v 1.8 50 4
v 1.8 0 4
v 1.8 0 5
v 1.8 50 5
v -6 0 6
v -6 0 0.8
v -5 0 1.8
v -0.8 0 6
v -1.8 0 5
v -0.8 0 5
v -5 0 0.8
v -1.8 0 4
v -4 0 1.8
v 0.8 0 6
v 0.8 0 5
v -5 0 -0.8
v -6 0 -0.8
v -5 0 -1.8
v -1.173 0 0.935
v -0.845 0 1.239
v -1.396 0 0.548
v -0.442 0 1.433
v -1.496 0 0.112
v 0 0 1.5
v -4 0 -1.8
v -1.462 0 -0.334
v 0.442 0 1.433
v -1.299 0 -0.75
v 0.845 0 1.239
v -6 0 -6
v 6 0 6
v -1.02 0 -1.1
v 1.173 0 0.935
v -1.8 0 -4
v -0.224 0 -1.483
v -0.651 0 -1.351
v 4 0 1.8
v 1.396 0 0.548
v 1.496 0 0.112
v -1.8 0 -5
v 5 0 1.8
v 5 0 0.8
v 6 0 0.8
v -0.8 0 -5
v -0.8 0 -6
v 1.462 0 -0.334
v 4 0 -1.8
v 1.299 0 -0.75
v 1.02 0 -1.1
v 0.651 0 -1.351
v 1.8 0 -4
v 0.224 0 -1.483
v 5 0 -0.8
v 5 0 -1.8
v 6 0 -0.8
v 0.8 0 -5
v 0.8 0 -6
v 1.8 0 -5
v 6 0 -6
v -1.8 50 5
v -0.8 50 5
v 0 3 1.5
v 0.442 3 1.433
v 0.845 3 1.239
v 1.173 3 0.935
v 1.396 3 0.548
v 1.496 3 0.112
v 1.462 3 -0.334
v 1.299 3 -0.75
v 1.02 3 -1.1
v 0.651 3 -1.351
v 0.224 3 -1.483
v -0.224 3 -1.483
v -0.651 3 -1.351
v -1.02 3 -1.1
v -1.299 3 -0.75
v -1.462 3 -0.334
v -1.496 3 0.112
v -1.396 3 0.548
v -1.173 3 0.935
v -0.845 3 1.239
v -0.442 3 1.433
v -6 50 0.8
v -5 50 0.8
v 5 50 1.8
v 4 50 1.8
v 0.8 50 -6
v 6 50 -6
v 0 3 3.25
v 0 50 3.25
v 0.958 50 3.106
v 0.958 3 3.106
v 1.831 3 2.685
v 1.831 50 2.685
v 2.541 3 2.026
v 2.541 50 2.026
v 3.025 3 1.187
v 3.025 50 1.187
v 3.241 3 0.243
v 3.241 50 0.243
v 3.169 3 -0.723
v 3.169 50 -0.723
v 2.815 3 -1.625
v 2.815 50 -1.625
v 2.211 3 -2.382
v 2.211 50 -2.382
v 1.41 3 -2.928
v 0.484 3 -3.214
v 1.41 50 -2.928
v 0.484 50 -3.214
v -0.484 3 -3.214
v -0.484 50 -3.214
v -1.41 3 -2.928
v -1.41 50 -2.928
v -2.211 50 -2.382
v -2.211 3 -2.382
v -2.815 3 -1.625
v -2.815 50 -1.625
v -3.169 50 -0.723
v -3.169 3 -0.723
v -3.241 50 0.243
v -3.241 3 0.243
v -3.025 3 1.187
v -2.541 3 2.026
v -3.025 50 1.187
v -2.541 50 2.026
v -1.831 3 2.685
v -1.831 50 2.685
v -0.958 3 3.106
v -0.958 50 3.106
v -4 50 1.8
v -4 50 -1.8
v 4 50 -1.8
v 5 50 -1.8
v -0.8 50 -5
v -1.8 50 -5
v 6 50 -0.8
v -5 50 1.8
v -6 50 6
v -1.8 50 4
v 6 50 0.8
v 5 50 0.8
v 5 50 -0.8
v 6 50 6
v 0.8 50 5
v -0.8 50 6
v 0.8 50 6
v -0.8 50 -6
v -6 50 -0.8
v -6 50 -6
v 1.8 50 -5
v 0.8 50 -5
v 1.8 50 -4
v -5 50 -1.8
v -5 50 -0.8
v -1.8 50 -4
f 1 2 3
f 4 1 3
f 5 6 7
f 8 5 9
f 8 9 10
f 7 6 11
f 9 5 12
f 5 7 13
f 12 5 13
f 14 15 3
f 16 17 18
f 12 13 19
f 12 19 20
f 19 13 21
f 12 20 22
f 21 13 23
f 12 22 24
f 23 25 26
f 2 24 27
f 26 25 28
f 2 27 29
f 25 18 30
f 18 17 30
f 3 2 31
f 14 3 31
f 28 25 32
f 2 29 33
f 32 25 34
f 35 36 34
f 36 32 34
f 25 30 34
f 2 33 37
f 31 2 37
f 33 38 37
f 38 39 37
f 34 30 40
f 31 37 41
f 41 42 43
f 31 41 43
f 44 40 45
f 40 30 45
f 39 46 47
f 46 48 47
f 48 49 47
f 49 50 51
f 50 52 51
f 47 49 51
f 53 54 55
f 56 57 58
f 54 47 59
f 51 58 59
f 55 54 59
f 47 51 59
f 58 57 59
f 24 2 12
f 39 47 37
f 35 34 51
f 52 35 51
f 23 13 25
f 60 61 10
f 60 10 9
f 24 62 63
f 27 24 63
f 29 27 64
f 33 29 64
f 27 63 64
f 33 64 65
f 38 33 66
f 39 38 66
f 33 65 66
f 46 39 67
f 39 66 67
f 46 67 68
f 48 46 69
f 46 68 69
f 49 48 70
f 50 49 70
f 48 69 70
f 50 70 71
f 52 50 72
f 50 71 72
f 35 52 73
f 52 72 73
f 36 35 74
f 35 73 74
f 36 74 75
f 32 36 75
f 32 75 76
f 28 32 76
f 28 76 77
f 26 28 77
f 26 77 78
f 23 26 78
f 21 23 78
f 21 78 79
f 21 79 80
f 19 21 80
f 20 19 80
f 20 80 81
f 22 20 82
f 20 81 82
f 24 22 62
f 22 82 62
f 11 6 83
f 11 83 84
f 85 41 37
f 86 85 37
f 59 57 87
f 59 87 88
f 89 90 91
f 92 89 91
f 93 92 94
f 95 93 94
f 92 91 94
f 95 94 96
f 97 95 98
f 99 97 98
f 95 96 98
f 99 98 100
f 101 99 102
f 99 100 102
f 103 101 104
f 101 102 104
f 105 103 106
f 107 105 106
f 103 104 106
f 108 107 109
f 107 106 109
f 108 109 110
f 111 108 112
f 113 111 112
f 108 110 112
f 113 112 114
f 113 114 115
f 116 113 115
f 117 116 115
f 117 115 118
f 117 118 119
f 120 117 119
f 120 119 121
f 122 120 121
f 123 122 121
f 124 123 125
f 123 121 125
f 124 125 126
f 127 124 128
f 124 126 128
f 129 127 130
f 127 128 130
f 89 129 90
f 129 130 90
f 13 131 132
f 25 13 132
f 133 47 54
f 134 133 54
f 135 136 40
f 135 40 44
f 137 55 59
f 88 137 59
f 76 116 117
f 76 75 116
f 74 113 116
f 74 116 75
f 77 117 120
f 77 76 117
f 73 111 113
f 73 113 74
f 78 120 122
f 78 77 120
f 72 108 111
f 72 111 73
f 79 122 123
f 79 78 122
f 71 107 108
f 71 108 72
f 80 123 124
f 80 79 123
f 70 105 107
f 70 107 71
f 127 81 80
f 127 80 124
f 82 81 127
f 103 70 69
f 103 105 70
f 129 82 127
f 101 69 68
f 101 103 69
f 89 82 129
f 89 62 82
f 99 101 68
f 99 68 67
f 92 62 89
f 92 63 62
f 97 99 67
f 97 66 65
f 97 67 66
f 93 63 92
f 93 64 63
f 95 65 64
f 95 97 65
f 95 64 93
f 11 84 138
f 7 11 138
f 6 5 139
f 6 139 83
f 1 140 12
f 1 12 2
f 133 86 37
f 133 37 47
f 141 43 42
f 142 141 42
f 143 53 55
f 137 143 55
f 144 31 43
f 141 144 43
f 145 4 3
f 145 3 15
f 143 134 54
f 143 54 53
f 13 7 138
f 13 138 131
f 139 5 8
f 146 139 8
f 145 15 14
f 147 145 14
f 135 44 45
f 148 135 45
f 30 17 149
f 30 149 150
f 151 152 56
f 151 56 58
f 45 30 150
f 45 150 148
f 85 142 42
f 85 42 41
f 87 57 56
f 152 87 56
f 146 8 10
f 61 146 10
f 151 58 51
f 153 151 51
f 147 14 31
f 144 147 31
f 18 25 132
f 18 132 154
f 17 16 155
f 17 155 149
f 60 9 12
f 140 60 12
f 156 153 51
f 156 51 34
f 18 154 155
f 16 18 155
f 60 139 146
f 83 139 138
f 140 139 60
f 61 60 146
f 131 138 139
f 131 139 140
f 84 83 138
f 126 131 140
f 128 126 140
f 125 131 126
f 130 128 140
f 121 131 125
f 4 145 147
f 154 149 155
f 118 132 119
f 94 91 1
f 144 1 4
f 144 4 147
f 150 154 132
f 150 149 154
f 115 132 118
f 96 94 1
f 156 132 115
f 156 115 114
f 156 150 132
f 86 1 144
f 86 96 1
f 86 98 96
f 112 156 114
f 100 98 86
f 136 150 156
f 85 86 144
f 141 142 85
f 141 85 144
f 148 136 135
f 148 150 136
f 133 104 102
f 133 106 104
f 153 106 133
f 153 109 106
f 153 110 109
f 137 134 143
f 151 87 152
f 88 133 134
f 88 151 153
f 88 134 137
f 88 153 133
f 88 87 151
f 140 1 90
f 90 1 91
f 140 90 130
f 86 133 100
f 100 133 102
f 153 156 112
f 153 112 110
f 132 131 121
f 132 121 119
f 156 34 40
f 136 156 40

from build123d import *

# Parameters (mm, degrees)
ESQUISSE1_W             = 12
ESQUISSE1_H             = 12
BOSS_EXTRU_1_DEPTH      = 50
ENL_V_MAT_EXTRU_1_DEPTH = 50
ESQUISSE3_R             = 3.25
ENL_V_MAT_EXTRU_2_DEPTH = 47
ESQUISSE4_R             = 1.5
ENL_V_MAT_EXTRU_3_DEPTH = 3


with BuildPart() as part:
    # Esquisse1 → Boss.-Extru.1 (new body)
    with BuildSketch(Plane(origin=(0, 0, 0), x_dir=(1, 0, 0), z_dir=(0, 1, 0))):
        Rectangle(ESQUISSE1_W, ESQUISSE1_H)
    extrude(amount=BOSS_EXTRU_1_DEPTH)

    # Esquisse2 → Enlèv. mat.-Extru.1 (cut)
    with BuildSketch(Plane(origin=(0, 50, 0), x_dir=(1, 0, 0), z_dir=(0, 1, 0))):
        Polygon((-5, -0.8), (-5, -1.8), (-4, -1.8), (-4, 1.8), (-5, 1.8), (-5, 0.8), (-6, 0.8), (-6, -0.8), align=None)
        Polygon((1.8, 5), (1.8, 4), (-1.8, 4), (-1.8, 5), (-0.8, 5), (-0.8, 6), (0.8, 6), (0.8, 5), align=None)
        Polygon((5, -1.8), (4, -1.8), (4, 1.8), (5, 1.8), (5, 0.8), (6, 0.8), (6, -0.8), (5, -0.8), align=None)
        Polygon((-1.8, -5), (-1.8, -4), (1.8, -4), (1.8, -5), (0.8, -5), (0.8, -6), (-0.8, -6), (-0.8, -5), align=None)
    extrude(amount=-ENL_V_MAT_EXTRU_1_DEPTH, mode=Mode.SUBTRACT)

    # Esquisse3 → Enlèv. mat.-Extru.2 (cut)
    with BuildSketch(Plane(origin=(0, 50, 0), x_dir=(1, 0, 0), z_dir=(0, 1, 0))):
        with Locations(Location((0, 0, 0), (0, 0, 270))):
            Circle(ESQUISSE3_R)
    extrude(amount=-ENL_V_MAT_EXTRU_2_DEPTH, mode=Mode.SUBTRACT)

    # Esquisse4 → Enlèv. mat.-Extru.3 (cut)
    with BuildSketch(Plane(origin=(0, 3, 0), x_dir=(1, 0, 0), z_dir=(0, 1, 0))):
        with Locations(Location((0, 0, 0), (0, 0, 270))):
            Circle(ESQUISSE4_R)
    extrude(amount=-ENL_V_MAT_EXTRU_3_DEPTH, mode=Mode.SUBTRACT)


solid = part.part
